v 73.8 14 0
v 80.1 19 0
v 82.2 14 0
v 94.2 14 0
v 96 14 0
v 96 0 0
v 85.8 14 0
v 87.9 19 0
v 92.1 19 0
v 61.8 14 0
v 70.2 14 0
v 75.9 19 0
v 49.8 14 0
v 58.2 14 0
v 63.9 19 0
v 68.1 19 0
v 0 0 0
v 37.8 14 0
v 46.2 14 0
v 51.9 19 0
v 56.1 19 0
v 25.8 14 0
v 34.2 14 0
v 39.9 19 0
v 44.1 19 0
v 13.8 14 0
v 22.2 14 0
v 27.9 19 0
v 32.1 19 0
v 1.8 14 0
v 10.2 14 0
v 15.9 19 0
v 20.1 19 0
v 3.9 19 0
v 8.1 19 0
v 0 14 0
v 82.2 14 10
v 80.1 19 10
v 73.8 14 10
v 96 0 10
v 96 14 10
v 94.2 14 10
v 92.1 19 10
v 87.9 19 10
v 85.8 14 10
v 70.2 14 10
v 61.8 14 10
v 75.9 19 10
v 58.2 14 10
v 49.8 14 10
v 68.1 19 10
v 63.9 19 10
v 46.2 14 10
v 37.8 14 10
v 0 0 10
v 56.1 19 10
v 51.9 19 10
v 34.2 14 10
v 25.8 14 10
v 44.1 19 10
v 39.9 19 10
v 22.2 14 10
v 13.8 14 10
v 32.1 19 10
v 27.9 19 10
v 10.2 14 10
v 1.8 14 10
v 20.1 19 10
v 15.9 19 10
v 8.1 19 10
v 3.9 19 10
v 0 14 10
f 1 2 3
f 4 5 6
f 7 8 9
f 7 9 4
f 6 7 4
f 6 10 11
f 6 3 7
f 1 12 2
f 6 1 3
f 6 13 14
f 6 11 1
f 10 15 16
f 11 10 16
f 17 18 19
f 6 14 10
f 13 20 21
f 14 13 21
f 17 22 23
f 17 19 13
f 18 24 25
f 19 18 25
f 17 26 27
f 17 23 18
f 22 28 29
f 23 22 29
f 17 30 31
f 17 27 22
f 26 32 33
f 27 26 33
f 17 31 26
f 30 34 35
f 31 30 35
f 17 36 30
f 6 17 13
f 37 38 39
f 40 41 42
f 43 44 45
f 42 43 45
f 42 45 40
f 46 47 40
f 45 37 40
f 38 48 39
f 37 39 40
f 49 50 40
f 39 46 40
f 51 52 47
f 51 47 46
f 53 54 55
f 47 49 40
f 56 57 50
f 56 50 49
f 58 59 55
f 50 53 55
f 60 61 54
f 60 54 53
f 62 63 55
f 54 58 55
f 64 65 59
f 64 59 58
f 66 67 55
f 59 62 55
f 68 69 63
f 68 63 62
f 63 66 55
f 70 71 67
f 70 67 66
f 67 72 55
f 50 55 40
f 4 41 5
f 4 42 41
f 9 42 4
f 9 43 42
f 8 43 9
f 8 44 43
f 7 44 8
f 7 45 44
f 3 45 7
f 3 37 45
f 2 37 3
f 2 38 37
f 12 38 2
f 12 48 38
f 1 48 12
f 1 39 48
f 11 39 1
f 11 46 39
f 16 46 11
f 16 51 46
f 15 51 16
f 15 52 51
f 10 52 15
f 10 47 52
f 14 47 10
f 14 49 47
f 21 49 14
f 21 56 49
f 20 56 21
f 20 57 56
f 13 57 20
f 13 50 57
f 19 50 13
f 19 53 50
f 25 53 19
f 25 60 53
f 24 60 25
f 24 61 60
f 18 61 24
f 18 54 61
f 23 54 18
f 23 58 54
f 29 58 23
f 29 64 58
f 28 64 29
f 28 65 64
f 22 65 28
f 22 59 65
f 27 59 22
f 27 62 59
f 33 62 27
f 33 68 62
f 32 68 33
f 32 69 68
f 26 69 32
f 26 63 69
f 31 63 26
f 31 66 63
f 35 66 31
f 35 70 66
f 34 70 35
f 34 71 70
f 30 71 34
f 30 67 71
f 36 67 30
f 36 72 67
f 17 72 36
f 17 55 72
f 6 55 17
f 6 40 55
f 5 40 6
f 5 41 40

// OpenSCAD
$fn = 32;

// ----------------------------------------------------------------------
// Gear rack: 8 teeth, pitch 12 mm
// ----------------------------------------------------------------------

// --- parameters (mm) ---
teeth = 8;                // number of teeth
pitch = 12;               // tooth pitch, X
root_w = 8.4;             // tooth width at the root
tip_w = 4.2;              // tooth width at the tip
base_h = 14;              // rack body height, Y
tooth_h = 5;              // tooth height above the body
plate_t = 10;             // rack width, Z (extrusion height)

rack_l = teeth * pitch;  // overall length
total_h = base_h + tooth_h;  // overall height

profile = [[0, 0], [96, 0], [96, 14], [94.2, 14], [92.1, 19], [87.9, 19], [85.8, 14], [82.2, 14], [80.1, 19], [75.9, 19], [73.8, 14], [70.2, 14], [68.1, 19], [63.9, 19], [61.8, 14], [58.2, 14], [56.1, 19], [51.9, 19], [49.8, 14], [46.2, 14], [44.1, 19], [39.9, 19], [37.8, 14], [34.2, 14], [32.1, 19], [27.9, 19], [25.8, 14], [22.2, 14], [20.1, 19], [15.9, 19], [13.8, 14], [10.2, 14], [8.1, 19], [3.9, 19], [1.8, 14], [0, 14]];  // primary outline, 36 points, counter clockwise

// --- the one profile operation ---
linear_extrude(height = plate_t) polygon(points = profile);
